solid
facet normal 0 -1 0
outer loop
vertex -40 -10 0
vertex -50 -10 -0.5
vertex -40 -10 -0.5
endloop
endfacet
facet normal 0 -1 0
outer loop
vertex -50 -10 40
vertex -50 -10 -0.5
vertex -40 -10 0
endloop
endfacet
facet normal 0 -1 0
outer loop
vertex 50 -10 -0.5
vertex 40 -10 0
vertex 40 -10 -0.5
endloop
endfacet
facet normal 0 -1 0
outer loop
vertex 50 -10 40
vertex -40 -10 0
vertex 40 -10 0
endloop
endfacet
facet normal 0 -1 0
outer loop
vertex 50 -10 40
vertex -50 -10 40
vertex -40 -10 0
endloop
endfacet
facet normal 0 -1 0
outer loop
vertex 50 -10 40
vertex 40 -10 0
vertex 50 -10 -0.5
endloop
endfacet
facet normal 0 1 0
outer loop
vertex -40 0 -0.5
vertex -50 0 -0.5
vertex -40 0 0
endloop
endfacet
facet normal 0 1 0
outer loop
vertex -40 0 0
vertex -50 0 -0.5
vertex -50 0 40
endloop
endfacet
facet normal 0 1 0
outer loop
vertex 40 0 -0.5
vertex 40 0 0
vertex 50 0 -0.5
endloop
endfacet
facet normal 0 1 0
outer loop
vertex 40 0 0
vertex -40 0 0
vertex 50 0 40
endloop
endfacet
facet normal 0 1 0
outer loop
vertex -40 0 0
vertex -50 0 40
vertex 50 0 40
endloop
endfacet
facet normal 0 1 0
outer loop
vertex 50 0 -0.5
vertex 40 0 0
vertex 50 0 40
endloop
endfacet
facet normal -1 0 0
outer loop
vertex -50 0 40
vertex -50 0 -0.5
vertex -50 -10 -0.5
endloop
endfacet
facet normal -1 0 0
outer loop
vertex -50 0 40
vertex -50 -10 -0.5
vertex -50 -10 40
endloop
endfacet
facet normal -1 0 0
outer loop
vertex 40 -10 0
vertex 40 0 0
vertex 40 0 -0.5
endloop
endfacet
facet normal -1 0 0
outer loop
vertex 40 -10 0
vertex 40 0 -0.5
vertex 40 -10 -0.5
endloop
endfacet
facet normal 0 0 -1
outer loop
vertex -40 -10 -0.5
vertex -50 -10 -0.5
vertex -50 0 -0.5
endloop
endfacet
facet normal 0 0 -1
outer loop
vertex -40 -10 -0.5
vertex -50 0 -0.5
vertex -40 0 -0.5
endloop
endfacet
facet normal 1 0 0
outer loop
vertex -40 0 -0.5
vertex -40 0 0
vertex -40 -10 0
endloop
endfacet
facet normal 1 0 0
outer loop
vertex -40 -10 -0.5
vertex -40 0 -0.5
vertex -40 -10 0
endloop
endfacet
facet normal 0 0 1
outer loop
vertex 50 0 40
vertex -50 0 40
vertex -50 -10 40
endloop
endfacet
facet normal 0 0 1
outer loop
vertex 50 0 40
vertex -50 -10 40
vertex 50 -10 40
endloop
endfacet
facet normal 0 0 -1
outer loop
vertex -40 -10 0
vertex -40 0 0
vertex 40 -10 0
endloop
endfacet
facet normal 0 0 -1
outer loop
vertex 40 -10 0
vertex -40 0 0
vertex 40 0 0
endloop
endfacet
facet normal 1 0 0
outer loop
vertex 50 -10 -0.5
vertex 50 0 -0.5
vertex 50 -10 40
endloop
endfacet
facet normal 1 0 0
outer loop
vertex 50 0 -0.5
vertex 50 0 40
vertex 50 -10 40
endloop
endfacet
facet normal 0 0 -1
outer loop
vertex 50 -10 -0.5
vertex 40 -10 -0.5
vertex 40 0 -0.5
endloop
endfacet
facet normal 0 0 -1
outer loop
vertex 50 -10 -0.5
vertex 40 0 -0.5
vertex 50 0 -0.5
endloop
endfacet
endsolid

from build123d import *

# Parameters (mm, degrees)
F0_W     = 100
F0_H     = 40
F1_DEPTH = 10
F2_W     = 10
F2_H     = 10
F3_DEPTH = 0.5


with BuildPart() as f1:
    # F0 (on Front) → F1 (new body)
    with BuildSketch(Plane.XZ):
        with Locations((0, 20)):
            Rectangle(F0_W, F0_H)
    extrude(amount=F1_DEPTH)

    # F2 (on face) → F3 (join)
    with BuildSketch(Plane(origin=(0, 0, 0), x_dir=(1, 0, 0), z_dir=(0, 0, -1))):
        with Locations((45, 5)):
            Rectangle(F2_W, F2_H)
        with Locations((-45, 5)):
            Rectangle(F2_W, F2_H)
    extrude(amount=F3_DEPTH)


solid = f1.part
